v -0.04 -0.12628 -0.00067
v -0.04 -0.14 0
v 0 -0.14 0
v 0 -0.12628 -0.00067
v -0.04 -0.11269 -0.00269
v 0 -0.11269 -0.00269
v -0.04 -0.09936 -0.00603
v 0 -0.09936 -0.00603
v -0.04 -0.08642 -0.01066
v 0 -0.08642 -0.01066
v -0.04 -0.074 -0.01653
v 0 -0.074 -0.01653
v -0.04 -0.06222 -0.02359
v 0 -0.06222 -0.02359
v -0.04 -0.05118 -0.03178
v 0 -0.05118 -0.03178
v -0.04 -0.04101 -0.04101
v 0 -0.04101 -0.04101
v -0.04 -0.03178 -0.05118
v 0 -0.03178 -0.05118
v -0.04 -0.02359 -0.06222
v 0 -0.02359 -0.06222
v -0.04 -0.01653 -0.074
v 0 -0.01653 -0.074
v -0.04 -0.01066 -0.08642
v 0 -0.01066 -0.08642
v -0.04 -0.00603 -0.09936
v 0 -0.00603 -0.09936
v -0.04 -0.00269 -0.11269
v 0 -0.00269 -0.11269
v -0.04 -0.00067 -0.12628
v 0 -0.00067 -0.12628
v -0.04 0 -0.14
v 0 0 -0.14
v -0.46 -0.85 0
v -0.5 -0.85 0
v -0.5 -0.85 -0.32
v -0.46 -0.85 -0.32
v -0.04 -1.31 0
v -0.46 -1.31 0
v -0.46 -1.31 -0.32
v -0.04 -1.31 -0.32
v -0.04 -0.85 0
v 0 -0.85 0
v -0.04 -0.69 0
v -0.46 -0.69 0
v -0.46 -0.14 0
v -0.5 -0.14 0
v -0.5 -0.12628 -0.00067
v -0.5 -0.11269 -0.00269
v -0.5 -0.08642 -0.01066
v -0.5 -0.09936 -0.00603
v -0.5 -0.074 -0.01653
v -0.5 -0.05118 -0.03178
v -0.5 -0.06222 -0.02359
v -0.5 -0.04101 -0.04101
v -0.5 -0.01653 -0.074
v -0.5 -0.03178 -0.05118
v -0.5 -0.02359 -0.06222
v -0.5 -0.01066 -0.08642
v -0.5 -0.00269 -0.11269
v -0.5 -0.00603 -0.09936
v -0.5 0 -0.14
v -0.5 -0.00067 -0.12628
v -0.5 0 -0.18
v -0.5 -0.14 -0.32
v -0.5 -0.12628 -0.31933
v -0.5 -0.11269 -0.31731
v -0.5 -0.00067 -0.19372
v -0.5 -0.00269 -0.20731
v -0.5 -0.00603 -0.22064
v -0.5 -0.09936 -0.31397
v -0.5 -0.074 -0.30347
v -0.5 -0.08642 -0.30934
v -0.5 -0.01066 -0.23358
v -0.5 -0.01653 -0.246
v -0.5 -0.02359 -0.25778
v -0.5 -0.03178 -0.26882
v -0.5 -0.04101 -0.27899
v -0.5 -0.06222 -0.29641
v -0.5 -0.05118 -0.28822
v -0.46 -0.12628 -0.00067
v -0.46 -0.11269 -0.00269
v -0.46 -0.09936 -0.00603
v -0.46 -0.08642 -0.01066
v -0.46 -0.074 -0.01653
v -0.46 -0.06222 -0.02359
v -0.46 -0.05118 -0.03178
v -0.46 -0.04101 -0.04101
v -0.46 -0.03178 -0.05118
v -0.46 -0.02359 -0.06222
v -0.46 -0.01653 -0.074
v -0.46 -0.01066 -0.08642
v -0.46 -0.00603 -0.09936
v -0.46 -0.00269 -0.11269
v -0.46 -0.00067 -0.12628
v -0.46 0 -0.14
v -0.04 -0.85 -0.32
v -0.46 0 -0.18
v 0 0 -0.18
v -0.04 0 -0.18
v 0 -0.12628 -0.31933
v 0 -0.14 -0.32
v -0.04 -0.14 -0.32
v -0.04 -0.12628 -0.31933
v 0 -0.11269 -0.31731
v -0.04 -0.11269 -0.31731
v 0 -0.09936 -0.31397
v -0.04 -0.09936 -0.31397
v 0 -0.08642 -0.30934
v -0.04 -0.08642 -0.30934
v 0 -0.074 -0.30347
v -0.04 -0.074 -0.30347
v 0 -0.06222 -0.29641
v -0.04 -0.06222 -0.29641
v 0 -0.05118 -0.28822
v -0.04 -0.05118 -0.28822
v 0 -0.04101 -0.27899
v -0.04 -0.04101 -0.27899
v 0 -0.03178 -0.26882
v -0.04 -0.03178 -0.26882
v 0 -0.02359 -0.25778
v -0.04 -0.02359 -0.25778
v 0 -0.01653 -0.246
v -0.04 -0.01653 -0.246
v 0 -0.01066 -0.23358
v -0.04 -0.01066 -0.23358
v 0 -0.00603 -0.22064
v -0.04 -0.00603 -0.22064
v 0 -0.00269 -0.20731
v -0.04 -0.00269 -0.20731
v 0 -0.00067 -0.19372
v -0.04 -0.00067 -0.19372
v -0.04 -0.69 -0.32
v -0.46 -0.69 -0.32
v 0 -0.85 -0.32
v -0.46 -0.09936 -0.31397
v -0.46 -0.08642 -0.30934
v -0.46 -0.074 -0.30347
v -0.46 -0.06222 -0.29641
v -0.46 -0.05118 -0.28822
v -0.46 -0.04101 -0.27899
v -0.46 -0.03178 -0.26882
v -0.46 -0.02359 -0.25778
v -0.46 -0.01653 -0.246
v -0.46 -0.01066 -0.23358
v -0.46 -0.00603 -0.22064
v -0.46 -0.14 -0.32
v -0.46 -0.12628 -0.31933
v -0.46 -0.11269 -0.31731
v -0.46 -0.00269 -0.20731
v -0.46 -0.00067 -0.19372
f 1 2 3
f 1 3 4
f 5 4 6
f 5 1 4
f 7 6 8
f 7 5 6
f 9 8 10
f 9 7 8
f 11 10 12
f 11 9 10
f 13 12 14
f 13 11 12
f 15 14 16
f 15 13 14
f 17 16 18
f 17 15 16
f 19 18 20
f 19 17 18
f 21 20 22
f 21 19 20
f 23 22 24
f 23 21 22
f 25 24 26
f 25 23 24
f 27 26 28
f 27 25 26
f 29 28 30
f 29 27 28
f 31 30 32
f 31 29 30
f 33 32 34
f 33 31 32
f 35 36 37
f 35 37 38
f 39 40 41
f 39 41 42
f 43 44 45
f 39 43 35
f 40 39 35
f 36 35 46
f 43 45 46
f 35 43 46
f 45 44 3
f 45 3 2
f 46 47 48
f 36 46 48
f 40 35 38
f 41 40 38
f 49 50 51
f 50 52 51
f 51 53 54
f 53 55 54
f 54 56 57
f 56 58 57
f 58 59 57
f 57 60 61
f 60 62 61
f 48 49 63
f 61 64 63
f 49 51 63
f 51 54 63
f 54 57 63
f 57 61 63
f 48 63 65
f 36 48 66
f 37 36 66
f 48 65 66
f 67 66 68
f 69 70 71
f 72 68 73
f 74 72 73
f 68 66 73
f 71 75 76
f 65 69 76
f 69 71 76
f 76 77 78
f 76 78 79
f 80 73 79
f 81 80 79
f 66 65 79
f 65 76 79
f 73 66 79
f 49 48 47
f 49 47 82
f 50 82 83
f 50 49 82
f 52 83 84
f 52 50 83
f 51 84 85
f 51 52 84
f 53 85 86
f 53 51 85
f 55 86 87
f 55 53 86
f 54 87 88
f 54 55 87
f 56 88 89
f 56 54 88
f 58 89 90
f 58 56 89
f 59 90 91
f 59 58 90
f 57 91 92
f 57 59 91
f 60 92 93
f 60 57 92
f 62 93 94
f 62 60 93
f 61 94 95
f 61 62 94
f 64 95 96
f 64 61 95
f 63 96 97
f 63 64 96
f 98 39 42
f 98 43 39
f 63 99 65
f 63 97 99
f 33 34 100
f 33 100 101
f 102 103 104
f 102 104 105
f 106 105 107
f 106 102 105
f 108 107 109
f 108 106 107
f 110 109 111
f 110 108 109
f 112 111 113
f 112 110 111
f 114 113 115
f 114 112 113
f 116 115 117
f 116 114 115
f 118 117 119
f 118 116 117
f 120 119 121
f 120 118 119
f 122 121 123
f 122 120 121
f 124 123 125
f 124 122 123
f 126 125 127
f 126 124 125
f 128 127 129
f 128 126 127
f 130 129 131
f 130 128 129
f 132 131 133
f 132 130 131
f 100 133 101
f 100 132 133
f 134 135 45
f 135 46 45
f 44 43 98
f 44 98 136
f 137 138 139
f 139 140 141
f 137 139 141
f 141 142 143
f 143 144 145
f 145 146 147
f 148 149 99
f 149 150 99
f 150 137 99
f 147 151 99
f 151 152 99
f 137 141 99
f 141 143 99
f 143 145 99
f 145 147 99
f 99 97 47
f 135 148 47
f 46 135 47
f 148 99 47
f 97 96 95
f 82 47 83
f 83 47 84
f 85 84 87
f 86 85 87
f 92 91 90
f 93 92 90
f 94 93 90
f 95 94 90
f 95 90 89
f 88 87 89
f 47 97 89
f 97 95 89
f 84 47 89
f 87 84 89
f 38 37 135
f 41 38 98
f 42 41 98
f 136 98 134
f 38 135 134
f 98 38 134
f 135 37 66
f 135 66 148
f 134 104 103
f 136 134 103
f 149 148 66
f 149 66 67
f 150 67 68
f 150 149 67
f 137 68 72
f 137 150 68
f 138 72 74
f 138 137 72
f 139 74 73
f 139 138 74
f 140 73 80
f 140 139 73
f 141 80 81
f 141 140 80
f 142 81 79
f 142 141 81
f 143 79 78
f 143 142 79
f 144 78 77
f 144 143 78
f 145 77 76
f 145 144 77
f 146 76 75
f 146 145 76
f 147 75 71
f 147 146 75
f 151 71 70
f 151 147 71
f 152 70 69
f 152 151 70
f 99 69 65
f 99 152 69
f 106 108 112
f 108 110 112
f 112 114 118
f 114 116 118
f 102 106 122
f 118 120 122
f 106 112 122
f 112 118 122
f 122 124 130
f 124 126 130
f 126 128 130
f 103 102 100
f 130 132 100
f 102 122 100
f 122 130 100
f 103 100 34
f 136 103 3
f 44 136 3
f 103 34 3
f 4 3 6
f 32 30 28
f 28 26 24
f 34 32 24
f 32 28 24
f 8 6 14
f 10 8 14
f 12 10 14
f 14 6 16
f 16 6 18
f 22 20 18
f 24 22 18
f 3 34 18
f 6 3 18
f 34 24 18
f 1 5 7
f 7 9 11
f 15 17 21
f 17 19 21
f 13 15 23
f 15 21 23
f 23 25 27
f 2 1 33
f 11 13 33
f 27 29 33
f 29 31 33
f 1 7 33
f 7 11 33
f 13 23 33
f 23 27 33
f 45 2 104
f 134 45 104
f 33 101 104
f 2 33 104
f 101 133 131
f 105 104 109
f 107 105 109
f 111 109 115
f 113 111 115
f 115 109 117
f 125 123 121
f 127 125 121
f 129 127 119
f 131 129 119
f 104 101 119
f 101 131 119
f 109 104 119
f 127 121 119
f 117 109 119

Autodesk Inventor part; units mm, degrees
ref_plane "YZ Plane" through (0, 0, 0) normal (1, 0, 0) x (0, 1, 0)
ref_plane "XZ Plane" through (0, 0, 0) normal (0, 1, 0) x (-1, 0, 0)
ref_plane "XY Plane" through (0, 0, 0) normal (0, 0, 1) x (1, 0, 0)
sketch "スケッチ1" plane through (0, 0, 0) normal (0, 1, 0) x (-1, 0, 0)
  line L0 (0, 0) -> (0.04, 0)
  line L1 (0.04, 0) -> (0.04, -0.32)
  line L2 (0.04, -0.32) -> (0, -0.32)
  line L3 (0, -0.32) -> (0, 0)
  line L4 (0.46, 0) -> (0.5, 0)
  line L5 (0.5, 0) -> (0.5, -0.32)
  line L6 (0.5, -0.32) -> (0.46, -0.32)
  line L7 (0.46, -0.32) -> (0.46, 0)
  dimension "d2" = 0.04
  dimension "d3" = 0.32
  dimension "d8" = 0.04
  dimension "d9" = 0.32
extrude "押し出し1" add sketch "スケッチ1" against normal blind 0.69
sketch "スケッチ2" plane through (0, -0.69, 0) normal (0, -1, 0) x (1, 0, 0)
  line L0 (-0.5, -0.32) -> (-0.46, -0.32) projected
  line L1 (0, 0) -> (-0.5, 0)
  line L2 (-0.5, 0) -> (-0.5, -0.32)
  line L3 (-0.5, -0.32) -> (0, -0.32)
  line L4 (0, -0.32) -> (0, 0)
extrude "押し出し2" add sketch "スケッチ2" along normal blind 0.16
sketch "スケッチ3" plane through (0, -0.85, 0) normal (0, -1, 0) x (1, 0, 0)
  point P0 (0, 0)
sketch "スケッチ4" plane through (0, -0.85, 0) normal (0, -1, 0) x (1, 0, 0)
  line L0 (-0.04, 0) -> (-0.04, -0.32) projected
  line L1 (-0.46, -0.32) -> (-0.04, -0.32) projected
  line L2 (-0.04, 0) -> (-0.46, 0)
  line L3 (-0.46, 0) -> (-0.46, -0.32)
  line L4 (-0.46, -0.32) -> (-0.04, -0.32)
  line L5 (-0.04, -0.32) -> (-0.04, 0)
  point P0 (0, 0)
  dimension "d12" = 0.42
extrude "押し出し3" add sketch "スケッチ4" along normal blind 0.46
fillet "フィレット1" radius 0.14 4 edges at (-0.02, 0, 0) (-0.02, 0, -0.32) (-0.48, 0, 0) (-0.48, 0, -0.32)
sketch "スケッチ5" plane through (0, -0.85, 0) normal (1, 0, 0) x (0, 0, -1)
  point P0 (0, 0.85)
sketch "スケッチ6" plane through (-0.04, -0.85, 0) normal (1, 0, 0) x (0, 0, -1)
  point P0 (0, 0.85)
properties part number "CRANEJ3"
